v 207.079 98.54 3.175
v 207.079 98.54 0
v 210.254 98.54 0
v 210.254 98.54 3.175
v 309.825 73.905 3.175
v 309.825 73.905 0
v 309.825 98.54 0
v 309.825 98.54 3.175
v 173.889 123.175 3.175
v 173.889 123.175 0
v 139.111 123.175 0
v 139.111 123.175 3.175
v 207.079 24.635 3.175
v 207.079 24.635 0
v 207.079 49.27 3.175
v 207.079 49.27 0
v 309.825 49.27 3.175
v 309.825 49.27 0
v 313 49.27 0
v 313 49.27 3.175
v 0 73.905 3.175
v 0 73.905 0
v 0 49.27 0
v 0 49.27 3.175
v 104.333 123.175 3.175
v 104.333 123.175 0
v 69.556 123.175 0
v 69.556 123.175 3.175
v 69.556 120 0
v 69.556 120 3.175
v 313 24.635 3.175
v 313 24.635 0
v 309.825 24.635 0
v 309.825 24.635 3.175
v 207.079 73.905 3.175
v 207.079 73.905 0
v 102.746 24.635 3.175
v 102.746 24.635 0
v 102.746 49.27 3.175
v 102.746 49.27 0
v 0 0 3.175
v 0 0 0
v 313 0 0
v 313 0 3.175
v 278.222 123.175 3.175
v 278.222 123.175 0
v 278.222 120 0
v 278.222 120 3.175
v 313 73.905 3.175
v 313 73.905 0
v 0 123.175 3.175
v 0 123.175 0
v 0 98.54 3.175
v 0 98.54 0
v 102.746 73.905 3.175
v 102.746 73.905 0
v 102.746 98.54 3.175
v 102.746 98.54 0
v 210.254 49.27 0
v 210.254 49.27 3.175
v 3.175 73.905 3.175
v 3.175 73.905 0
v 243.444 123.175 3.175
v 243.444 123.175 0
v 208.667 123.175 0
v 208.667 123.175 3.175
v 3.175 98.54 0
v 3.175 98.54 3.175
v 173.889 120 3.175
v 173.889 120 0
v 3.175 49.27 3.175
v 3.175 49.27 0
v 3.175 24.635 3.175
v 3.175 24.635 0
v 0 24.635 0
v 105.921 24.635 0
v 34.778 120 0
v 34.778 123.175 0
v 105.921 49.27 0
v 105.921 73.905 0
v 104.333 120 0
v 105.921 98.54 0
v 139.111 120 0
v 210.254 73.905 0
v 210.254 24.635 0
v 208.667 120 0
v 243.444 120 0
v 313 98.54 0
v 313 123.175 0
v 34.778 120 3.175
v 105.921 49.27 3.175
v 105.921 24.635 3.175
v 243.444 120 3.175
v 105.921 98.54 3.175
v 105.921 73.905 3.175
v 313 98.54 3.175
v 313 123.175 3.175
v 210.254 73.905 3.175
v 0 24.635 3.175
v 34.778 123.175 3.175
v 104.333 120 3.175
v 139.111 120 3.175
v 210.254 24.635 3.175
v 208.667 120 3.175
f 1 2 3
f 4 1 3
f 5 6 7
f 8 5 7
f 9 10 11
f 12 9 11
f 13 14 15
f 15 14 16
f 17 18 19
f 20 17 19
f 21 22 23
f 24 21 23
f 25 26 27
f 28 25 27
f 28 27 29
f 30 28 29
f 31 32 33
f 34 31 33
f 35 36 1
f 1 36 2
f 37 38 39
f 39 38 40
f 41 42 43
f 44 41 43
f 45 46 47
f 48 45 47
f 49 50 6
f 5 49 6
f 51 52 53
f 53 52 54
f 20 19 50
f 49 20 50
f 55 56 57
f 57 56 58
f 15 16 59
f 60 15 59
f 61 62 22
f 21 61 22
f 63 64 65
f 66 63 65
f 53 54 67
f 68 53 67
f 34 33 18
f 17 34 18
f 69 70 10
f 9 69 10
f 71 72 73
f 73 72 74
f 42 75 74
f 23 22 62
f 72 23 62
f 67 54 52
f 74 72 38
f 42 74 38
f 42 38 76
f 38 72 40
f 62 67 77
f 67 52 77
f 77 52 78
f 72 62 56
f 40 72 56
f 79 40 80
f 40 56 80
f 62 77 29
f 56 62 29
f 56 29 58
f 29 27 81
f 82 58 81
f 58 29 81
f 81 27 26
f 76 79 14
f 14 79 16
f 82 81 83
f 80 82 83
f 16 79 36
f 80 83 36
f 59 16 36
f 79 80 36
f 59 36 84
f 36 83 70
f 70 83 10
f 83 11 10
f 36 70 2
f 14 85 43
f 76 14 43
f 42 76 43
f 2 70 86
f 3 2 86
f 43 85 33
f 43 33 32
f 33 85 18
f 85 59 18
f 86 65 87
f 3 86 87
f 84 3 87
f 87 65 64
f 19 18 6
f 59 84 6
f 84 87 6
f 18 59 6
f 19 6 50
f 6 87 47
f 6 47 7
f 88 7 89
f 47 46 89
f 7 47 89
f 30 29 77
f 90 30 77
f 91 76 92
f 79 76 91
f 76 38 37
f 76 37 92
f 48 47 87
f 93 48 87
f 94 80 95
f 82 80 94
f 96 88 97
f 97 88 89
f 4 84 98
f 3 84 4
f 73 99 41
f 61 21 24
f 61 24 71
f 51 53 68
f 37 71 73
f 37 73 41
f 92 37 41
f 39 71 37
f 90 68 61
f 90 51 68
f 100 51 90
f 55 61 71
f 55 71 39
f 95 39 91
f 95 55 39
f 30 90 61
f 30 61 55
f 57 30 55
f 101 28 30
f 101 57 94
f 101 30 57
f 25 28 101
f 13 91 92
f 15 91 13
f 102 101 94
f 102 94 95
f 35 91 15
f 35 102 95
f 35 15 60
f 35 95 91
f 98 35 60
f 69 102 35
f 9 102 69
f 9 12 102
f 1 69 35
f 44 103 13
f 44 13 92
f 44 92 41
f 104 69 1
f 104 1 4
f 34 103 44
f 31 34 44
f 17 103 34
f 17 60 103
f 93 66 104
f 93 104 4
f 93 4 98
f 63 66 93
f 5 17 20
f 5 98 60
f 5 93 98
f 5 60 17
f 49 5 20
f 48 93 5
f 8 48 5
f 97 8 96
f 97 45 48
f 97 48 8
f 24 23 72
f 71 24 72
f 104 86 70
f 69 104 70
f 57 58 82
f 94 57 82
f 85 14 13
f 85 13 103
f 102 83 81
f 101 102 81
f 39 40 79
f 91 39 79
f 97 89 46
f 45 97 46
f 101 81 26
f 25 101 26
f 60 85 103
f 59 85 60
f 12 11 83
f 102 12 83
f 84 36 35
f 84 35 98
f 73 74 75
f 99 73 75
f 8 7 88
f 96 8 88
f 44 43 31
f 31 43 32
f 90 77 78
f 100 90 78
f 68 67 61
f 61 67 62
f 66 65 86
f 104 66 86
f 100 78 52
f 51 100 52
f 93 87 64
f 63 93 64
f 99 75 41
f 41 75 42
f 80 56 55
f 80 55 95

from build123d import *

# Parameters (mm, degrees)
SKETCH1_W           = 3.175
SKETCH1_H           = 24.635
BOSS_EXTRUDE1_DEPTH = 3.175


with BuildPart() as part:
    # Sketch1 → Boss-Extrude1 (new body)
    with BuildSketch(Plane.XY):
        Polygon((0, 0), (313, 0), (313, 24.635), (309.825, 24.635), (309.825, 49.27), (313, 49.27), (313, 73.905), (309.825, 73.905), (309.825, 98.54), (313, 98.54), (313, 123.175), (278.222222222, 123.175), (278.222222222, 120), (243.444444444, 120), (243.444444444, 123.175), (208.666666667, 123.175), (208.666666667, 120), (173.888888889, 120), (173.888888889, 123.175), (139.111111111, 123.175), (139.111111111, 120), (104.333333333, 120), (104.333333333, 123.175), (69.555555556, 123.175), (69.555555556, 120), (34.777777778, 120), (34.777777778, 123.175), (0, 123.175), (0, 98.54), (3.175, 98.54), (3.175, 73.905), (0, 73.905), (0, 49.27), (3.175, 49.27), (3.175, 24.635), (0, 24.635), align=None)
        with Locations((104.333333333, 86.2225)):
            Rectangle(SKETCH1_W, SKETCH1_H, mode=Mode.SUBTRACT)
        with Locations((104.333333333, 36.9525)):
            Rectangle(SKETCH1_W, SKETCH1_H, mode=Mode.SUBTRACT)
        with Locations((208.666666667, 86.2225)):
            Rectangle(SKETCH1_W, SKETCH1_H, mode=Mode.SUBTRACT)
        with Locations((208.666666667, 36.9525)):
            Rectangle(SKETCH1_W, SKETCH1_H, mode=Mode.SUBTRACT)
    extrude(amount=BOSS_EXTRUDE1_DEPTH)


solid = part.part
